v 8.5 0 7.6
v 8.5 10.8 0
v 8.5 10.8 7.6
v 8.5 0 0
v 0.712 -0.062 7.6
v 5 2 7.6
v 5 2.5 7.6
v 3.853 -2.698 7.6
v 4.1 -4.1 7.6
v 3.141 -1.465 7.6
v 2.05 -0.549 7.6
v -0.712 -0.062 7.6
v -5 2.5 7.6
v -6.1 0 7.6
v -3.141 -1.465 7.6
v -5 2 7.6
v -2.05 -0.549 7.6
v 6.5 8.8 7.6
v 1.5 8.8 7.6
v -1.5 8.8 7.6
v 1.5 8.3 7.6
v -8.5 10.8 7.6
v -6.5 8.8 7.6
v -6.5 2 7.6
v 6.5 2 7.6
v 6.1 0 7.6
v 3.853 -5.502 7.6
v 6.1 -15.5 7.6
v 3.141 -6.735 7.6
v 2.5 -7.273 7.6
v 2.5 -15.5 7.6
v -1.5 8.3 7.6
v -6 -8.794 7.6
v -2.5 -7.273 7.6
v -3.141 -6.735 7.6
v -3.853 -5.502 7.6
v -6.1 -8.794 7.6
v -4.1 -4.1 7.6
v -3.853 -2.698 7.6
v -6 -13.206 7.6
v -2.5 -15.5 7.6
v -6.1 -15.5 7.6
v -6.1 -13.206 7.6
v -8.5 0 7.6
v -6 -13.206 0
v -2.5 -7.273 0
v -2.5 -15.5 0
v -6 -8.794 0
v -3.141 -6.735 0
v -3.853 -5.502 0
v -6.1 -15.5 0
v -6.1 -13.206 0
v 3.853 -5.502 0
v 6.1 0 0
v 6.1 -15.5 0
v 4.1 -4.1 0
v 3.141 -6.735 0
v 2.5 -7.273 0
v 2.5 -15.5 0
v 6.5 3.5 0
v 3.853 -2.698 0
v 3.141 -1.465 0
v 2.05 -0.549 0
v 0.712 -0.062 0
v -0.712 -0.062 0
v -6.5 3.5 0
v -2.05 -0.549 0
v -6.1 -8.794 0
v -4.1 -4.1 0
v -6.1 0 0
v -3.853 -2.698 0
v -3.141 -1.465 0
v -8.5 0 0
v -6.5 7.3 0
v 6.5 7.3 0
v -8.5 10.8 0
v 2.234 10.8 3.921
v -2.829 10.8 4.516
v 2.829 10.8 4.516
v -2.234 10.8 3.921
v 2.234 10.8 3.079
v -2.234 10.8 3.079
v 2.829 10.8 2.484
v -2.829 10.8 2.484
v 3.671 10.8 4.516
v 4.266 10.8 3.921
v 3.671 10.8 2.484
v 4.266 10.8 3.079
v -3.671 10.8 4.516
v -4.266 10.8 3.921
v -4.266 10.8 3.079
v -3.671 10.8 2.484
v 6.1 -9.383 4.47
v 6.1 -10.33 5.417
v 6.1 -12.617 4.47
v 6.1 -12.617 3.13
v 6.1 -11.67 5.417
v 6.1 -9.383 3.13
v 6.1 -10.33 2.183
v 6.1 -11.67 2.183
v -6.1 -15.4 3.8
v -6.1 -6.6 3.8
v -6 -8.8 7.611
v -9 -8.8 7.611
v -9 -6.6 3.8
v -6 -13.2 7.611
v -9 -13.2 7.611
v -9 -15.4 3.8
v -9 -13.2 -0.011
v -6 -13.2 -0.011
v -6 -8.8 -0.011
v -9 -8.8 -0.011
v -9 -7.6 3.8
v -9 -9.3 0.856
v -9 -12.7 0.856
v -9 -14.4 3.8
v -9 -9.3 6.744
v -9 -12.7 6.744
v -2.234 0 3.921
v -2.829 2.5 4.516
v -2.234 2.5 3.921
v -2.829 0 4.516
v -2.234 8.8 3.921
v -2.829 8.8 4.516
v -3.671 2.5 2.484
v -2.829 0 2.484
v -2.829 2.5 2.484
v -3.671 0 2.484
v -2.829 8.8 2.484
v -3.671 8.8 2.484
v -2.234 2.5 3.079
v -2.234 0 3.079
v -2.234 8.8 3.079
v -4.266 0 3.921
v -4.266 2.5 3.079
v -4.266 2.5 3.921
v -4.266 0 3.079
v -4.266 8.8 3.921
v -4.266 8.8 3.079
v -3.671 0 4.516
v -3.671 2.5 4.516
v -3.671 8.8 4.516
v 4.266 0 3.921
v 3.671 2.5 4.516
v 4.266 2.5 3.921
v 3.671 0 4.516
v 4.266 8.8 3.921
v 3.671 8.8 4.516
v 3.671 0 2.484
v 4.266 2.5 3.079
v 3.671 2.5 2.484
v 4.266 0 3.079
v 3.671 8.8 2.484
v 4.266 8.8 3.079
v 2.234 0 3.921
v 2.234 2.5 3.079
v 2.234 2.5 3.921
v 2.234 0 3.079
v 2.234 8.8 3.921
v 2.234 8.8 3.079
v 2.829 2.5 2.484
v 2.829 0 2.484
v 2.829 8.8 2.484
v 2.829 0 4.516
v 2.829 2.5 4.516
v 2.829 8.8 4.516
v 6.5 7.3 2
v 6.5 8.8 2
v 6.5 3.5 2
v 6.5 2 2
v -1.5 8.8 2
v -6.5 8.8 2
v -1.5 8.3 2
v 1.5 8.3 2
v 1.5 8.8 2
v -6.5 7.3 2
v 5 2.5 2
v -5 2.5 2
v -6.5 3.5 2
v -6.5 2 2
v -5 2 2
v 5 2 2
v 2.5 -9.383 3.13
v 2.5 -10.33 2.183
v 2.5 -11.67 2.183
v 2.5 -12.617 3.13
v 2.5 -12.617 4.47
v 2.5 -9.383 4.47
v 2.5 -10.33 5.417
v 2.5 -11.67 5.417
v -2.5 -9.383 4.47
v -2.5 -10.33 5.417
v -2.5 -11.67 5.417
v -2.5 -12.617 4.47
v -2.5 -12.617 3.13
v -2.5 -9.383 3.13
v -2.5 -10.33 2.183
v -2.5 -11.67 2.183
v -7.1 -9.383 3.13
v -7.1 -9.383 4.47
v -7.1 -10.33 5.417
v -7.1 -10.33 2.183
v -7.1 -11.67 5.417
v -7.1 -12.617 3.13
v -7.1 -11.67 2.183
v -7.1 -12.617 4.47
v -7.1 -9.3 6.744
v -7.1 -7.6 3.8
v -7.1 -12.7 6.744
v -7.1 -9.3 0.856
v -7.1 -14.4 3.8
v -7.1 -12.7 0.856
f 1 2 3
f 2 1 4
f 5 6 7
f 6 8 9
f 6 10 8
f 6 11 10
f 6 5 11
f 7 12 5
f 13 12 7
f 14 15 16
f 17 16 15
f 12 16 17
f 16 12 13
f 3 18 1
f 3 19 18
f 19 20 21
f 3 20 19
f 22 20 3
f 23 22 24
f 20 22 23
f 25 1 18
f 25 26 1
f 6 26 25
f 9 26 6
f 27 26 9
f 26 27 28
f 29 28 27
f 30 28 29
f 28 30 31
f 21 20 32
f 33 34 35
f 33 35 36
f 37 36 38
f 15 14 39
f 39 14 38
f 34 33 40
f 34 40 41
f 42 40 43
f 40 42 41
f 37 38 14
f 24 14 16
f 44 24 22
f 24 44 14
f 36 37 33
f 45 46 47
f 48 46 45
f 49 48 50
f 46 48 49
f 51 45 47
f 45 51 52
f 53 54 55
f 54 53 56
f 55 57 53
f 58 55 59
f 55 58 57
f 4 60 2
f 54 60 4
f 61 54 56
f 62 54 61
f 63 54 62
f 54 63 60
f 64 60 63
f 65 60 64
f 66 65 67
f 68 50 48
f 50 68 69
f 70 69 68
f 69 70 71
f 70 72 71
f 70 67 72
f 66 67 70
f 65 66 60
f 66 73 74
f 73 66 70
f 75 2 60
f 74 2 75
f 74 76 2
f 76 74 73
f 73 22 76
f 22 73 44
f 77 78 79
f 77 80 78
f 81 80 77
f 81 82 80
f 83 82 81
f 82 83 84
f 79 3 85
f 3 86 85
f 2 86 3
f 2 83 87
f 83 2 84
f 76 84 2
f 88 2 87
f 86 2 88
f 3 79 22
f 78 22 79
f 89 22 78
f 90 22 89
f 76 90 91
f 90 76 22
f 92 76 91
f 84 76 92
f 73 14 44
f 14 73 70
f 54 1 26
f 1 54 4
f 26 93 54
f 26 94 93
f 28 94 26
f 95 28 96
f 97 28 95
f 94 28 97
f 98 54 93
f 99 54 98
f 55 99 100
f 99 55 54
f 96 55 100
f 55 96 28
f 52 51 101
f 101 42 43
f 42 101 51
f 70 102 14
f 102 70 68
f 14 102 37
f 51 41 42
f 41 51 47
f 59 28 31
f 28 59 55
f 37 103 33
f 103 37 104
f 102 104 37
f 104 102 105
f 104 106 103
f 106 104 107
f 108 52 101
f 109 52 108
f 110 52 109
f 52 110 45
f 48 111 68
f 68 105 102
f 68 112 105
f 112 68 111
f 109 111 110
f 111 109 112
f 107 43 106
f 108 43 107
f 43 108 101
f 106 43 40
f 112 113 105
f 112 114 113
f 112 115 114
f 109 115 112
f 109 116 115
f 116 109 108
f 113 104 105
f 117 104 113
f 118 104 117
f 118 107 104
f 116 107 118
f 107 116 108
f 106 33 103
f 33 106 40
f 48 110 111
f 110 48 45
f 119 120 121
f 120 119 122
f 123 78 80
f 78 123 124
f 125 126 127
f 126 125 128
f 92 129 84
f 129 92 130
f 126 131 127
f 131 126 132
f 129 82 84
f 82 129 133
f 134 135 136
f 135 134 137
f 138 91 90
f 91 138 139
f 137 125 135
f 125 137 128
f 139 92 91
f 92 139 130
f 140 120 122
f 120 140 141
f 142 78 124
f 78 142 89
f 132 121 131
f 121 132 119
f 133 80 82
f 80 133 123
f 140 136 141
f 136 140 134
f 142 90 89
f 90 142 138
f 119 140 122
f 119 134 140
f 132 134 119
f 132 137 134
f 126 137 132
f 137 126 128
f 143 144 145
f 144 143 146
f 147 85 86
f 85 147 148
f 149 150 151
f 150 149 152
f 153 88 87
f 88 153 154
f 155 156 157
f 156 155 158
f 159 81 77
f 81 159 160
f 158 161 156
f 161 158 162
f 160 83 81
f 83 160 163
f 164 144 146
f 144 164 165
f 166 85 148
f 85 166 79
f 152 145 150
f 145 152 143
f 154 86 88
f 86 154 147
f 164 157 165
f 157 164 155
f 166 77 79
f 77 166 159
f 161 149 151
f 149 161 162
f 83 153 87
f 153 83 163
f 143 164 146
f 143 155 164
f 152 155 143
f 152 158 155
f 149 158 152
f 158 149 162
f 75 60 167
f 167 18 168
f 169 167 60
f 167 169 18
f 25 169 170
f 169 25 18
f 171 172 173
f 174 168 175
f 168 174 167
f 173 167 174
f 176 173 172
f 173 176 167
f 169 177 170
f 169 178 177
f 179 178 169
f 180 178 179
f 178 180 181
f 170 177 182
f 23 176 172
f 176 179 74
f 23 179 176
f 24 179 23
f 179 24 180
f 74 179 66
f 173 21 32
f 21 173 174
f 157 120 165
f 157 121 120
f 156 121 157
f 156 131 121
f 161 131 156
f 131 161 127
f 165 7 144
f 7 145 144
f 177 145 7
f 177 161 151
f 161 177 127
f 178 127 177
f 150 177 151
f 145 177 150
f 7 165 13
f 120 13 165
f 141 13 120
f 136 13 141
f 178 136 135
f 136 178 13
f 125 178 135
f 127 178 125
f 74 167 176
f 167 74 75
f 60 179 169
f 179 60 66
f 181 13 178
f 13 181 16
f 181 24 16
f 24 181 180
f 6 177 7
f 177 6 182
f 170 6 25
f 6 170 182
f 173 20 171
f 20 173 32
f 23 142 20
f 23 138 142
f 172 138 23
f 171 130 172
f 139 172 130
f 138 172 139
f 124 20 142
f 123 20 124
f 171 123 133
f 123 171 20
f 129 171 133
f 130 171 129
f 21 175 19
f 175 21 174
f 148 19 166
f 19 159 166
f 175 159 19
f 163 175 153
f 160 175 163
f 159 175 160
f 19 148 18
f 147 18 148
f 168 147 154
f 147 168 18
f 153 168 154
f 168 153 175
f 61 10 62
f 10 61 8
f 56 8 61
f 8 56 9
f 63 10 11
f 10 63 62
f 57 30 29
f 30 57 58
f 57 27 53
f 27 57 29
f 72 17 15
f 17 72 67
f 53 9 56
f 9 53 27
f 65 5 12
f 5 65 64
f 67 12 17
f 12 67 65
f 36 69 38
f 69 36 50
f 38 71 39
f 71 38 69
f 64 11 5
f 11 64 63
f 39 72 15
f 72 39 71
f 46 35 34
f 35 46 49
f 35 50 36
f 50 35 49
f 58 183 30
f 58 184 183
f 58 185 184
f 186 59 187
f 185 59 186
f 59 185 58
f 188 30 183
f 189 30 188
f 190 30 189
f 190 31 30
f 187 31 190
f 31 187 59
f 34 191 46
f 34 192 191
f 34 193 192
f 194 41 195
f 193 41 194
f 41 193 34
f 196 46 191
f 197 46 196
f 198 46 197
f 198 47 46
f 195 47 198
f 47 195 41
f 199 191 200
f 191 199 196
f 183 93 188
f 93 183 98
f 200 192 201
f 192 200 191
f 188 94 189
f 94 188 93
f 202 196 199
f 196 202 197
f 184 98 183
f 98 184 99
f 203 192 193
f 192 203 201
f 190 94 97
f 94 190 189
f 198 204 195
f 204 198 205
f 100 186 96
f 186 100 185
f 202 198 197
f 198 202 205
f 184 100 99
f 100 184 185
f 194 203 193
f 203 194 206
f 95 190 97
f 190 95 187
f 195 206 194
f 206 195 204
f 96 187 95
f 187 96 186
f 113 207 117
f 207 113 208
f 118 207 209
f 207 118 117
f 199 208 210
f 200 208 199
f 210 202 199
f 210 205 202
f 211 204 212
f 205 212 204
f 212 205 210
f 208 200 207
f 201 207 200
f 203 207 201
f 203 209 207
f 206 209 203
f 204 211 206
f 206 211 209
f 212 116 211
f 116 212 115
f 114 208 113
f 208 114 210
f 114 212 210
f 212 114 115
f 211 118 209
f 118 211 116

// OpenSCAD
// PRUSA Mendel  
// Microswitch mount
// Used for mounting tiny microswitches with no lever
// GNU GPL v2
// Ian Stratford
// ginjaian@gmail.com

ms_x = 13; // exact size = 12.8
ms_y = 5.8; // exact size = 5.8
ms_z = 6.6; // exact size = 6.6
m8_diameter = 8.2;
m3_diameter = 3.5;
m3_nut_diameter = 6.8; // normally 6.2mm

module microswitch()
{
	difference()
	{
		union()
		{
		translate ([0,0,0]) cube ([ms_x+4,ms_y+4+1,ms_z+1]); // microswitch housing
		translate( [((ms_x+4)/2)-((m8_diameter + 4)/2), -15.5, 0] ) cube( [m8_diameter + 4, 17, ms_z+1] ); // clamp
		translate( [ms_x/2-7, -11, (ms_z+1)/2] ) rotate( [0, 90, 0] ) rotate ([0,0,30]) cylinder( h = 3, r = (ms_z+2.2) / 2, $fn = 6 ); // captive nut
		}

	translate ([ms_x/2+2-6.5/2, ms_y+5.5, 3.5]) rotate ([90,22.5,0]) #cylinder (h=ms_y+5.5, r=1.1, $fn=8); // screw hole
	translate ([ms_x/2+2+6.5/2, ms_y+5.5, 3.5]) rotate ([90,22.5,0]) #cylinder (h=ms_y+5.5, r=1.1, $fn=8); // screw hole
	translate ([2,2.5,2]) cube ([ms_x,ms_y,ms_z]); // microswitch
	translate ([2,3.5,-.5]) cube ([ms_x,ms_y-2,ms_z+1]); // back slot
	translate ([2,2,2]) cube ([1.5,1.5,ms_z]); // removes extra from corners for easier fit
	translate ([ms_x+0.5,2,2]) cube ([1.5,1.5,ms_z]); // removes extra from corners for easier fit
	translate ([2,1.5+ms_y,2]) cube ([5,1.5,ms_z]); // removes extra from corners for easier fit
	translate ([ms_x-3,1.5+ms_y,2]) cube ([5,1.5,ms_z]); // removes extra from corners for easier fit


	translate( [((ms_x+4)/2), -m8_diameter/2, -0.5] ) cylinder( h = ms_z+2, r = m8_diameter/2, $fn = 18 ); // M8 rod hole
	translate( [((ms_x+4)/2), -m8_diameter/2-5, (ms_z+1)/2] ) cube( [5, 14, ms_z+2], center = true ); // clamp split
	translate( [0, -11, (ms_z+1)/2] ) rotate( [0, 90, 0] ) rotate ([0,0,22.5]) cylinder( h = ms_x+4, r = m3_diameter / 2, $fn = 8 ); // clamp bolt hole
	translate( [ms_x/2-7.5, -11, (ms_z+1)/2] ) rotate( [0, 90, 0] ) rotate ([0,0,30]) cylinder( h = 2.4, r = m3_nut_diameter/2 , $fn = 6 ); // captive nut cut out


	}
}


translate ([-ms_x/2-2,0,0]) microswitch();
